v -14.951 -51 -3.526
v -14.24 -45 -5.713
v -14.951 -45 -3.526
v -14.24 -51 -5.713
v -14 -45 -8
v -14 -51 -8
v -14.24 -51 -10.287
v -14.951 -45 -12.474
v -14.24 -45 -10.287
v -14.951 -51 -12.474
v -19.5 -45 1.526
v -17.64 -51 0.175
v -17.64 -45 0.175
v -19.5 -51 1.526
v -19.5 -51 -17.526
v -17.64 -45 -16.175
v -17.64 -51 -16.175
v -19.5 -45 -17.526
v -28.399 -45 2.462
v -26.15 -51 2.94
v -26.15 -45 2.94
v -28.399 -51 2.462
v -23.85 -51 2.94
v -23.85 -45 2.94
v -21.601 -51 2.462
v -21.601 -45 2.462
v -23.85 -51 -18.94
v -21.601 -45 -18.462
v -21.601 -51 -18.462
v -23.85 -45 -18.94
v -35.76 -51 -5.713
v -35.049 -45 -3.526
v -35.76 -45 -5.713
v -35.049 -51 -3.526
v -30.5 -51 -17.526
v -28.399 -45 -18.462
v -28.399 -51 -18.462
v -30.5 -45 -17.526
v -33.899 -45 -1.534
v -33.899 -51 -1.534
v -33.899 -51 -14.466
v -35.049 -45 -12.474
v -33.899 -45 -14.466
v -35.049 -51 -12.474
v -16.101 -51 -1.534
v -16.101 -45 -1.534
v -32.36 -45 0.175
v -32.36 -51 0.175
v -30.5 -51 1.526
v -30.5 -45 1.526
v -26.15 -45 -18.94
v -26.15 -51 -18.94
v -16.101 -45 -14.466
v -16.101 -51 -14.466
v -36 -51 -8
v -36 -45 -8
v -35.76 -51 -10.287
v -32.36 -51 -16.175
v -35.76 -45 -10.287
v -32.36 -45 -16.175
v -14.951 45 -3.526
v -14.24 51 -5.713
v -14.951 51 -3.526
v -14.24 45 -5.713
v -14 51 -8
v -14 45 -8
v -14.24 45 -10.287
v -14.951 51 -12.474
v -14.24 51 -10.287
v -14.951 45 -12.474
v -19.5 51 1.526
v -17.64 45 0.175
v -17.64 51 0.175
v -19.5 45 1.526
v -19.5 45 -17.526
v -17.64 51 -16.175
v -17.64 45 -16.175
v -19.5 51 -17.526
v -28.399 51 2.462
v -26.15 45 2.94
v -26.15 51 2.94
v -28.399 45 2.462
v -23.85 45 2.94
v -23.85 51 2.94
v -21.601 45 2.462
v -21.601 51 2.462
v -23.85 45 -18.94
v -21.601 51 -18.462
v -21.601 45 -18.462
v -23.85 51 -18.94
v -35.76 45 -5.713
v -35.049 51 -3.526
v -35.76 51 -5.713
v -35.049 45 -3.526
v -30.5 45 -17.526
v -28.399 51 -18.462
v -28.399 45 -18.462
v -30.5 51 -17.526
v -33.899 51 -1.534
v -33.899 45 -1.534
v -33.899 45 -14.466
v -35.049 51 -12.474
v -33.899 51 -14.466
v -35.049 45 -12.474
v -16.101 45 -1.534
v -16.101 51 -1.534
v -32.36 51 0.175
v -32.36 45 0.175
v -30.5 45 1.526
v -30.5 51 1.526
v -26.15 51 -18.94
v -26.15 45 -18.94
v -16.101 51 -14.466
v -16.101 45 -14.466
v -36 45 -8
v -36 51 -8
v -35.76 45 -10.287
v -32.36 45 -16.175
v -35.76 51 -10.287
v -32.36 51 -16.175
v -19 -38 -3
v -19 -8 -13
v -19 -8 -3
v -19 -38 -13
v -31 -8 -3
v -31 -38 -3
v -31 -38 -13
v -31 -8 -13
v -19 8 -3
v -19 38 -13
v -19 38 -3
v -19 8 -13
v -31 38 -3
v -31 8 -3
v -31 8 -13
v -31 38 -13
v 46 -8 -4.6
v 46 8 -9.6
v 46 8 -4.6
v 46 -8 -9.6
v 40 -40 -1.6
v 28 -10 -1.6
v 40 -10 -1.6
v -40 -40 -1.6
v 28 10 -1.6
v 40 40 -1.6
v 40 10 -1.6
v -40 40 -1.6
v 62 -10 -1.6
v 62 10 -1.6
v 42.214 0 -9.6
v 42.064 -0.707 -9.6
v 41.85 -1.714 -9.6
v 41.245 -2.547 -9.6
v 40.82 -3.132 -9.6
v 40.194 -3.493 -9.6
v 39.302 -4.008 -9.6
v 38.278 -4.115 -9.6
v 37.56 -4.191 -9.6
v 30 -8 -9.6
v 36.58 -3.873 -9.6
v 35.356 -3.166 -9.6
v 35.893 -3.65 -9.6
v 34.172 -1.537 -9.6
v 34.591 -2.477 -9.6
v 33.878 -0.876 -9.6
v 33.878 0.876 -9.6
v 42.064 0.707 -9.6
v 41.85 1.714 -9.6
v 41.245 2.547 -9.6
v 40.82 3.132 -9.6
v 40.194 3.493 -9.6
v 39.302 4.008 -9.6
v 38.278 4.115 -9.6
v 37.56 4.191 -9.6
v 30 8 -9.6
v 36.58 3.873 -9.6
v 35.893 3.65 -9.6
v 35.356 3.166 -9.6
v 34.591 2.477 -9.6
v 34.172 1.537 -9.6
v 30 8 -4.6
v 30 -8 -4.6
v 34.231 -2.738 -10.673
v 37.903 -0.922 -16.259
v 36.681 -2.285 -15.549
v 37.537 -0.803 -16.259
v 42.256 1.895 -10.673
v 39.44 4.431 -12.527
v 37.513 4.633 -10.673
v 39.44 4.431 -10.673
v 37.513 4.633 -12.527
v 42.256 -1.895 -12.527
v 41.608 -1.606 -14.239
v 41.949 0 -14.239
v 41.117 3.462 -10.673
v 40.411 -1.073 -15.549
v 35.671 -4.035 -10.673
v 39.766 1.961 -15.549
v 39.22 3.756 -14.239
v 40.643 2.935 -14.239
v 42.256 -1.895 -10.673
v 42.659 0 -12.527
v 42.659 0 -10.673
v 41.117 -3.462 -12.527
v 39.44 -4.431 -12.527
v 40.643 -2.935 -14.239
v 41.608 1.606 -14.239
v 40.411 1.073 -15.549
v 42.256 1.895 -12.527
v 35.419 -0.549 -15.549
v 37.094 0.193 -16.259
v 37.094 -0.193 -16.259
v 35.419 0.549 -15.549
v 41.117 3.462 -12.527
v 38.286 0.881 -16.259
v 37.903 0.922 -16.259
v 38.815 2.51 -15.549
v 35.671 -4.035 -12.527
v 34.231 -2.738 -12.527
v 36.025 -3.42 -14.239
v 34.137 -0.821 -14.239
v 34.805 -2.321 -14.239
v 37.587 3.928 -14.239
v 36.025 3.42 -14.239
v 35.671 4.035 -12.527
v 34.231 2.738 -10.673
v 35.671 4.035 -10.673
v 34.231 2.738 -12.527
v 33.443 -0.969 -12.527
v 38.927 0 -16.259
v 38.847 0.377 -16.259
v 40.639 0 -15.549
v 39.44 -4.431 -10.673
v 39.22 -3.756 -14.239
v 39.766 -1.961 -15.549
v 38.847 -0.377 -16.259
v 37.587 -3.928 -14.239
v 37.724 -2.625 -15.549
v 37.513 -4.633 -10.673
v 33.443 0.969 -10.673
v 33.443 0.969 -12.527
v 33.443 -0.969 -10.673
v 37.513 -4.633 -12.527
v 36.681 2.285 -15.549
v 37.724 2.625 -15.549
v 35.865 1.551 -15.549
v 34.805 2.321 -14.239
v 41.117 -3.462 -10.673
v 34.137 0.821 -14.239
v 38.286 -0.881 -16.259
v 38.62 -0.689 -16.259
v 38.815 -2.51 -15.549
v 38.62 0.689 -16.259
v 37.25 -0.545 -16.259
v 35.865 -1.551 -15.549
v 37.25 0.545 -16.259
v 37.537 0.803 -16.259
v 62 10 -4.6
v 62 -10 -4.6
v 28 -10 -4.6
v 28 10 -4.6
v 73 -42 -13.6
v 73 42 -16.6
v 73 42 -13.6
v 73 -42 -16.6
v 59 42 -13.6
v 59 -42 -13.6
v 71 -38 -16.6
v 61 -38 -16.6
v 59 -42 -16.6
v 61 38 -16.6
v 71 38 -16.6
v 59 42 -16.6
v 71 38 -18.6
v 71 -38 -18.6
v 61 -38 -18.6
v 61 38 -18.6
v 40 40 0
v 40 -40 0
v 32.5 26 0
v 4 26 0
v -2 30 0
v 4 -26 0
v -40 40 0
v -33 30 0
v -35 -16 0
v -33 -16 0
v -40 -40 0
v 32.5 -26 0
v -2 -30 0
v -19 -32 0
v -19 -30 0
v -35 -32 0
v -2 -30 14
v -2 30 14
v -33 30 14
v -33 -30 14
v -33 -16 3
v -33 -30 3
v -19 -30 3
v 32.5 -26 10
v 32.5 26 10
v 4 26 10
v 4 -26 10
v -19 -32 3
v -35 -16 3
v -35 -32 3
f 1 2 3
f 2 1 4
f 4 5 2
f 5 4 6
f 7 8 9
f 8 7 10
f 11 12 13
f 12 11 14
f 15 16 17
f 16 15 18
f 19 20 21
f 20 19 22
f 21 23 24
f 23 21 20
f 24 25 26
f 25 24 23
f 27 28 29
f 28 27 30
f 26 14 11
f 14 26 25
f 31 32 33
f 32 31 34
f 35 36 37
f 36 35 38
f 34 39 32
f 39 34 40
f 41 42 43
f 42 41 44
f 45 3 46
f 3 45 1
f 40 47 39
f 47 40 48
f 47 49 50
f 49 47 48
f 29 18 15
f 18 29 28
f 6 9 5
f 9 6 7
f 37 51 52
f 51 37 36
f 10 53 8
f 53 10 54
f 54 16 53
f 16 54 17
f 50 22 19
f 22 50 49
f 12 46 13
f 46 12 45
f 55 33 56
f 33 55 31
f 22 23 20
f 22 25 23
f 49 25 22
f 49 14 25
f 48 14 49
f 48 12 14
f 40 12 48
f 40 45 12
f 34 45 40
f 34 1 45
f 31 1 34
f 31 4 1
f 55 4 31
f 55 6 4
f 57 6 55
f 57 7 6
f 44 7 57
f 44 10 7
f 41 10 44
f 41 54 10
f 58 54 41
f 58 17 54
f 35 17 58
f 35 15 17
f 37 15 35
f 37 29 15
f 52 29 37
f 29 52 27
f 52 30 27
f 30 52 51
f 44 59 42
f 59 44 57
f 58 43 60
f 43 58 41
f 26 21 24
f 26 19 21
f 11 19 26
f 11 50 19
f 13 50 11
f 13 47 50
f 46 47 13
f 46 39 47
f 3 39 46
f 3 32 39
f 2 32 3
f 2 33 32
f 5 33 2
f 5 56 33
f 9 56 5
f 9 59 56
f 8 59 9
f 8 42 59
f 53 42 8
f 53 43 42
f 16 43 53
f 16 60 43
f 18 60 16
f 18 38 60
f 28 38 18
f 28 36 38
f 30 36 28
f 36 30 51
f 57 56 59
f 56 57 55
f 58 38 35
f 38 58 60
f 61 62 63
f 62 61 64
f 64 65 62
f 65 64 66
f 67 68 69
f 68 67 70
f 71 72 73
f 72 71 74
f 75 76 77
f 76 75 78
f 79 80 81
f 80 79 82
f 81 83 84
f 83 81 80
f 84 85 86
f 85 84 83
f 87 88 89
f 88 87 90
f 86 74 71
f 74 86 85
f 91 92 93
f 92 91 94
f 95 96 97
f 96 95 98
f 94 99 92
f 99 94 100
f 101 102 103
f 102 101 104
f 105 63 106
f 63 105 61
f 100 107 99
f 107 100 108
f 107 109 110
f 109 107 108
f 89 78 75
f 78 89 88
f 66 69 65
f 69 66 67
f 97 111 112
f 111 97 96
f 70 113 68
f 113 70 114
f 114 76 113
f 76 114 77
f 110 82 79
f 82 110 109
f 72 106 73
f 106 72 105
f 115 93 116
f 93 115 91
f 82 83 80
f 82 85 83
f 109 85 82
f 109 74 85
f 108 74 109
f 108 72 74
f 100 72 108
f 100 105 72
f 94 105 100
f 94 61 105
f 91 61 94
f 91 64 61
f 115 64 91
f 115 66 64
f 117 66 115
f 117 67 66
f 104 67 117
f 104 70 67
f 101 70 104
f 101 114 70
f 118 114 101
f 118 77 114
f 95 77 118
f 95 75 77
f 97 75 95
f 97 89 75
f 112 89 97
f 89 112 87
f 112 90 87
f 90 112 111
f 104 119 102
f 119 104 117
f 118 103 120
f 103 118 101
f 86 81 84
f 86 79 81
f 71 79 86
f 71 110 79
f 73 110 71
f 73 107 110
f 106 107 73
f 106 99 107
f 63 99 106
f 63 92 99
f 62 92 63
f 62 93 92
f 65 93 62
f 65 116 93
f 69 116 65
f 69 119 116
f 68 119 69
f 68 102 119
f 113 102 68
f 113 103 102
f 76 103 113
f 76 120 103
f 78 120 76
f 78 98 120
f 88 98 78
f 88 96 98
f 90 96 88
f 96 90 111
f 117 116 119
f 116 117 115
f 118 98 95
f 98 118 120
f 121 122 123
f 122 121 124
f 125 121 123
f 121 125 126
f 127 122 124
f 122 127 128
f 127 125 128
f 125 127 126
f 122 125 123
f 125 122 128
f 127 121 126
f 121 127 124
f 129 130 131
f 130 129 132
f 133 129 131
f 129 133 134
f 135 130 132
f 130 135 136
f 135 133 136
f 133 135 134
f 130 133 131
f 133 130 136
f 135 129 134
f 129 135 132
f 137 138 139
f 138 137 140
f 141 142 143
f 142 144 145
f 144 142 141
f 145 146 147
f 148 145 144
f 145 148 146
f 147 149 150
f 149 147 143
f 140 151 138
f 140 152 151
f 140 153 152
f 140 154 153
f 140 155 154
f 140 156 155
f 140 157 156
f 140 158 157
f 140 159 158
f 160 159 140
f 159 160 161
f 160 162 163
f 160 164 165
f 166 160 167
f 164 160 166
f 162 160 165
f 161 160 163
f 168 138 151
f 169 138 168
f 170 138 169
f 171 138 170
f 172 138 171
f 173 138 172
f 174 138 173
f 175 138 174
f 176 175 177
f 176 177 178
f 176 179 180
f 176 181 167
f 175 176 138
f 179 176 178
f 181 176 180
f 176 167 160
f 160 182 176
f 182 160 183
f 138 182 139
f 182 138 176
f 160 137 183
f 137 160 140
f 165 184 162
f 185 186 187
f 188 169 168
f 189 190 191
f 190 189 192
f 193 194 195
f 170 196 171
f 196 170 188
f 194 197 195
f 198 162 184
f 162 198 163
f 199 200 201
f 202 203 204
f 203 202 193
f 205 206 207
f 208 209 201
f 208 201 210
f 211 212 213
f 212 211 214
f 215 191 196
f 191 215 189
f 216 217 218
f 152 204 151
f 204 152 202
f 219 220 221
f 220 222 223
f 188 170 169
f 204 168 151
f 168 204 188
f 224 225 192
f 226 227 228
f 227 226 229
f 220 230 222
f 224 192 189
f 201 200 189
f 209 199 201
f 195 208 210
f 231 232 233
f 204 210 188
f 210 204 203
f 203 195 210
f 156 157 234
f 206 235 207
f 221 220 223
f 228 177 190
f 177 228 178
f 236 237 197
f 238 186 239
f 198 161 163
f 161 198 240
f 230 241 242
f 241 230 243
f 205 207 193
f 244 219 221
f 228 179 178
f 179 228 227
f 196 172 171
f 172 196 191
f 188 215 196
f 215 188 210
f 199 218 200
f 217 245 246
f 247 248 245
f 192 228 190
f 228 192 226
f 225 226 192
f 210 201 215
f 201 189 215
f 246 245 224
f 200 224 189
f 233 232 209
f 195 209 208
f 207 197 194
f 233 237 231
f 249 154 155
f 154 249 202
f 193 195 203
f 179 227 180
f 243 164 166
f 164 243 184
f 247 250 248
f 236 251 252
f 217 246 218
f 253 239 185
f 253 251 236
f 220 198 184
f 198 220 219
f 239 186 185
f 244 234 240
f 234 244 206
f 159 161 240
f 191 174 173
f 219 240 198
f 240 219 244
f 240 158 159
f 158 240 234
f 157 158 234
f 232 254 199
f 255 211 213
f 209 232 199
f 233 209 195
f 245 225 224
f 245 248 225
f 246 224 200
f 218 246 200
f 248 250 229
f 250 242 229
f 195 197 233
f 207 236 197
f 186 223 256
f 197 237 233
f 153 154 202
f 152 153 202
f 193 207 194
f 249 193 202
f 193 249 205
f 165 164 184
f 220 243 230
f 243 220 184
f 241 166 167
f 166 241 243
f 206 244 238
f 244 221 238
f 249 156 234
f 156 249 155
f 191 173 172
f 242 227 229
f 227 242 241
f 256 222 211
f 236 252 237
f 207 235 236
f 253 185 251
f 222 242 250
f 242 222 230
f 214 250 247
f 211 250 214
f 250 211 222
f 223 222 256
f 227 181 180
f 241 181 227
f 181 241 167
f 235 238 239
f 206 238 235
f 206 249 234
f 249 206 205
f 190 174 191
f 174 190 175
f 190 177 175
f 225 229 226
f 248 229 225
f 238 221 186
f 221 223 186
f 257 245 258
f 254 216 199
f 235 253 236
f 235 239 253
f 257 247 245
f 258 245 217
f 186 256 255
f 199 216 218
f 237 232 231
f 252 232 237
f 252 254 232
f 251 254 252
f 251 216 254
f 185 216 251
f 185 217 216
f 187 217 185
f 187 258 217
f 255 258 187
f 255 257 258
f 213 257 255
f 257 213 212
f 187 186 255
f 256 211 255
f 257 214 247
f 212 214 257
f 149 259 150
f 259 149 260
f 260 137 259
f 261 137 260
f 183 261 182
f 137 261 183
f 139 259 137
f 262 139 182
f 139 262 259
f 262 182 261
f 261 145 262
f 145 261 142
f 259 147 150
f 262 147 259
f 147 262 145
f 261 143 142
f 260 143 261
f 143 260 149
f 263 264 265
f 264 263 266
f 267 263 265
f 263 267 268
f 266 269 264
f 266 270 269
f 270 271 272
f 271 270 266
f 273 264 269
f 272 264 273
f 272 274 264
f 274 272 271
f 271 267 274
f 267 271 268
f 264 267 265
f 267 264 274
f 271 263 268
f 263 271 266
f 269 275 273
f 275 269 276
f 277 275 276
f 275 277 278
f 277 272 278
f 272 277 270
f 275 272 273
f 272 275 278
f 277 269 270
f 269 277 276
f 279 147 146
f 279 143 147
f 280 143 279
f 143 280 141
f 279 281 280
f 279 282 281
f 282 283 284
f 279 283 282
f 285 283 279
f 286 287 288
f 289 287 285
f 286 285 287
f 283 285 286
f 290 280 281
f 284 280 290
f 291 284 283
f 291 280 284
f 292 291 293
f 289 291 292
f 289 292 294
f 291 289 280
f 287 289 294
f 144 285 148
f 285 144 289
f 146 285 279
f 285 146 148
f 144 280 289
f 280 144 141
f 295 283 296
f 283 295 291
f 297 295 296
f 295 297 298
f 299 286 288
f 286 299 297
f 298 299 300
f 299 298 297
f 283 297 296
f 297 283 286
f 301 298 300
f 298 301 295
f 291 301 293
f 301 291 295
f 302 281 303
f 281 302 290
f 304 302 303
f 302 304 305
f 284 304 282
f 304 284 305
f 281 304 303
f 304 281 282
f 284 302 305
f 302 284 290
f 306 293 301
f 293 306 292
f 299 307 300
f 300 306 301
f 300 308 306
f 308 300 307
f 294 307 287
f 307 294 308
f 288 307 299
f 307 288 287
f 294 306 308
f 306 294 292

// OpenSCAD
// ============================================================================
// Visualização do layout do robô — APENAS ILUSTRATIVA (não imprimir!)
// ============================================================================
// Abra no OpenSCAD para ver onde cada componente fica na placa 80 x 80 mm.
// Origem no CENTRO da placa; +X é a FRENTE do robô; Z=0 é o topo da placa.
// Útil também para gerar uma figura do layout para o TCC (File > Export).

board   = 80;     // lado da placa
board_t = 1.6;
wheel_d = 22;     // diâmetro da roda
wheel_w = 6;
axle_x  = -25;    // eixo das rodas: 15 mm da borda traseira
track   = 96;     // distância entre os centros das rodas
axle_z  = -8;     // eixo ~8 mm abaixo da placa (motor sob a placa)

// placa do robô
color("darkgreen")
    translate([-board / 2, -board / 2, -board_t])
        cube([board, board, board_t]);

// rodas
color("dimgray")
    for (s = [-1, 1])
        translate([axle_x, s * track / 2, axle_z])
            rotate([90, 0, 0])
                cylinder(d = wheel_d, h = wheel_w, center = true);

// motores N20 (sob a placa, um apontando para cada lado)
color("silver")
    for (s = [-1, 1])
        translate([axle_x - 6, (s == 1) ? 8 : -38, axle_z - 5])
            cube([12, 30, 10]);

// ball caster dianteiro (sob a placa)
color("steelblue") {
    translate([30, -8, -board_t - 8]) cube([16, 16, 8]);
    translate([38, 0, -board_t - 10]) sphere(d = 9.5);
}

// suporte + barra do QTR-8 (na frente, sensores a ~3 mm do chão)
color("crimson") {
    translate([28, -10, -board_t - 3]) cube([34, 20, 3]);       // braço
    translate([59, -42, -board_t - 15]) cube([14, 84, 3]);      // barra
    translate([61, -38, -board_t - 17]) cube([10, 76, 2]);      // QTR-8
}

// bateria (no topo, centrada sobre/junto ao eixo das rodas)
color("orange")
    translate([-33, -30, 0])
        cube([31, 60, 14]);

// ESP32 DevKit (no topo, à frente da bateria)
color("navy")
    translate([4, -26, 0])
        cube([28.5, 52, 10]);

// MPU-6050 (idealmente no ponto médio do eixo das rodas)
color("purple")
    translate([axle_x - 10, -32, 0])
        cube([16, 16, 3]);
